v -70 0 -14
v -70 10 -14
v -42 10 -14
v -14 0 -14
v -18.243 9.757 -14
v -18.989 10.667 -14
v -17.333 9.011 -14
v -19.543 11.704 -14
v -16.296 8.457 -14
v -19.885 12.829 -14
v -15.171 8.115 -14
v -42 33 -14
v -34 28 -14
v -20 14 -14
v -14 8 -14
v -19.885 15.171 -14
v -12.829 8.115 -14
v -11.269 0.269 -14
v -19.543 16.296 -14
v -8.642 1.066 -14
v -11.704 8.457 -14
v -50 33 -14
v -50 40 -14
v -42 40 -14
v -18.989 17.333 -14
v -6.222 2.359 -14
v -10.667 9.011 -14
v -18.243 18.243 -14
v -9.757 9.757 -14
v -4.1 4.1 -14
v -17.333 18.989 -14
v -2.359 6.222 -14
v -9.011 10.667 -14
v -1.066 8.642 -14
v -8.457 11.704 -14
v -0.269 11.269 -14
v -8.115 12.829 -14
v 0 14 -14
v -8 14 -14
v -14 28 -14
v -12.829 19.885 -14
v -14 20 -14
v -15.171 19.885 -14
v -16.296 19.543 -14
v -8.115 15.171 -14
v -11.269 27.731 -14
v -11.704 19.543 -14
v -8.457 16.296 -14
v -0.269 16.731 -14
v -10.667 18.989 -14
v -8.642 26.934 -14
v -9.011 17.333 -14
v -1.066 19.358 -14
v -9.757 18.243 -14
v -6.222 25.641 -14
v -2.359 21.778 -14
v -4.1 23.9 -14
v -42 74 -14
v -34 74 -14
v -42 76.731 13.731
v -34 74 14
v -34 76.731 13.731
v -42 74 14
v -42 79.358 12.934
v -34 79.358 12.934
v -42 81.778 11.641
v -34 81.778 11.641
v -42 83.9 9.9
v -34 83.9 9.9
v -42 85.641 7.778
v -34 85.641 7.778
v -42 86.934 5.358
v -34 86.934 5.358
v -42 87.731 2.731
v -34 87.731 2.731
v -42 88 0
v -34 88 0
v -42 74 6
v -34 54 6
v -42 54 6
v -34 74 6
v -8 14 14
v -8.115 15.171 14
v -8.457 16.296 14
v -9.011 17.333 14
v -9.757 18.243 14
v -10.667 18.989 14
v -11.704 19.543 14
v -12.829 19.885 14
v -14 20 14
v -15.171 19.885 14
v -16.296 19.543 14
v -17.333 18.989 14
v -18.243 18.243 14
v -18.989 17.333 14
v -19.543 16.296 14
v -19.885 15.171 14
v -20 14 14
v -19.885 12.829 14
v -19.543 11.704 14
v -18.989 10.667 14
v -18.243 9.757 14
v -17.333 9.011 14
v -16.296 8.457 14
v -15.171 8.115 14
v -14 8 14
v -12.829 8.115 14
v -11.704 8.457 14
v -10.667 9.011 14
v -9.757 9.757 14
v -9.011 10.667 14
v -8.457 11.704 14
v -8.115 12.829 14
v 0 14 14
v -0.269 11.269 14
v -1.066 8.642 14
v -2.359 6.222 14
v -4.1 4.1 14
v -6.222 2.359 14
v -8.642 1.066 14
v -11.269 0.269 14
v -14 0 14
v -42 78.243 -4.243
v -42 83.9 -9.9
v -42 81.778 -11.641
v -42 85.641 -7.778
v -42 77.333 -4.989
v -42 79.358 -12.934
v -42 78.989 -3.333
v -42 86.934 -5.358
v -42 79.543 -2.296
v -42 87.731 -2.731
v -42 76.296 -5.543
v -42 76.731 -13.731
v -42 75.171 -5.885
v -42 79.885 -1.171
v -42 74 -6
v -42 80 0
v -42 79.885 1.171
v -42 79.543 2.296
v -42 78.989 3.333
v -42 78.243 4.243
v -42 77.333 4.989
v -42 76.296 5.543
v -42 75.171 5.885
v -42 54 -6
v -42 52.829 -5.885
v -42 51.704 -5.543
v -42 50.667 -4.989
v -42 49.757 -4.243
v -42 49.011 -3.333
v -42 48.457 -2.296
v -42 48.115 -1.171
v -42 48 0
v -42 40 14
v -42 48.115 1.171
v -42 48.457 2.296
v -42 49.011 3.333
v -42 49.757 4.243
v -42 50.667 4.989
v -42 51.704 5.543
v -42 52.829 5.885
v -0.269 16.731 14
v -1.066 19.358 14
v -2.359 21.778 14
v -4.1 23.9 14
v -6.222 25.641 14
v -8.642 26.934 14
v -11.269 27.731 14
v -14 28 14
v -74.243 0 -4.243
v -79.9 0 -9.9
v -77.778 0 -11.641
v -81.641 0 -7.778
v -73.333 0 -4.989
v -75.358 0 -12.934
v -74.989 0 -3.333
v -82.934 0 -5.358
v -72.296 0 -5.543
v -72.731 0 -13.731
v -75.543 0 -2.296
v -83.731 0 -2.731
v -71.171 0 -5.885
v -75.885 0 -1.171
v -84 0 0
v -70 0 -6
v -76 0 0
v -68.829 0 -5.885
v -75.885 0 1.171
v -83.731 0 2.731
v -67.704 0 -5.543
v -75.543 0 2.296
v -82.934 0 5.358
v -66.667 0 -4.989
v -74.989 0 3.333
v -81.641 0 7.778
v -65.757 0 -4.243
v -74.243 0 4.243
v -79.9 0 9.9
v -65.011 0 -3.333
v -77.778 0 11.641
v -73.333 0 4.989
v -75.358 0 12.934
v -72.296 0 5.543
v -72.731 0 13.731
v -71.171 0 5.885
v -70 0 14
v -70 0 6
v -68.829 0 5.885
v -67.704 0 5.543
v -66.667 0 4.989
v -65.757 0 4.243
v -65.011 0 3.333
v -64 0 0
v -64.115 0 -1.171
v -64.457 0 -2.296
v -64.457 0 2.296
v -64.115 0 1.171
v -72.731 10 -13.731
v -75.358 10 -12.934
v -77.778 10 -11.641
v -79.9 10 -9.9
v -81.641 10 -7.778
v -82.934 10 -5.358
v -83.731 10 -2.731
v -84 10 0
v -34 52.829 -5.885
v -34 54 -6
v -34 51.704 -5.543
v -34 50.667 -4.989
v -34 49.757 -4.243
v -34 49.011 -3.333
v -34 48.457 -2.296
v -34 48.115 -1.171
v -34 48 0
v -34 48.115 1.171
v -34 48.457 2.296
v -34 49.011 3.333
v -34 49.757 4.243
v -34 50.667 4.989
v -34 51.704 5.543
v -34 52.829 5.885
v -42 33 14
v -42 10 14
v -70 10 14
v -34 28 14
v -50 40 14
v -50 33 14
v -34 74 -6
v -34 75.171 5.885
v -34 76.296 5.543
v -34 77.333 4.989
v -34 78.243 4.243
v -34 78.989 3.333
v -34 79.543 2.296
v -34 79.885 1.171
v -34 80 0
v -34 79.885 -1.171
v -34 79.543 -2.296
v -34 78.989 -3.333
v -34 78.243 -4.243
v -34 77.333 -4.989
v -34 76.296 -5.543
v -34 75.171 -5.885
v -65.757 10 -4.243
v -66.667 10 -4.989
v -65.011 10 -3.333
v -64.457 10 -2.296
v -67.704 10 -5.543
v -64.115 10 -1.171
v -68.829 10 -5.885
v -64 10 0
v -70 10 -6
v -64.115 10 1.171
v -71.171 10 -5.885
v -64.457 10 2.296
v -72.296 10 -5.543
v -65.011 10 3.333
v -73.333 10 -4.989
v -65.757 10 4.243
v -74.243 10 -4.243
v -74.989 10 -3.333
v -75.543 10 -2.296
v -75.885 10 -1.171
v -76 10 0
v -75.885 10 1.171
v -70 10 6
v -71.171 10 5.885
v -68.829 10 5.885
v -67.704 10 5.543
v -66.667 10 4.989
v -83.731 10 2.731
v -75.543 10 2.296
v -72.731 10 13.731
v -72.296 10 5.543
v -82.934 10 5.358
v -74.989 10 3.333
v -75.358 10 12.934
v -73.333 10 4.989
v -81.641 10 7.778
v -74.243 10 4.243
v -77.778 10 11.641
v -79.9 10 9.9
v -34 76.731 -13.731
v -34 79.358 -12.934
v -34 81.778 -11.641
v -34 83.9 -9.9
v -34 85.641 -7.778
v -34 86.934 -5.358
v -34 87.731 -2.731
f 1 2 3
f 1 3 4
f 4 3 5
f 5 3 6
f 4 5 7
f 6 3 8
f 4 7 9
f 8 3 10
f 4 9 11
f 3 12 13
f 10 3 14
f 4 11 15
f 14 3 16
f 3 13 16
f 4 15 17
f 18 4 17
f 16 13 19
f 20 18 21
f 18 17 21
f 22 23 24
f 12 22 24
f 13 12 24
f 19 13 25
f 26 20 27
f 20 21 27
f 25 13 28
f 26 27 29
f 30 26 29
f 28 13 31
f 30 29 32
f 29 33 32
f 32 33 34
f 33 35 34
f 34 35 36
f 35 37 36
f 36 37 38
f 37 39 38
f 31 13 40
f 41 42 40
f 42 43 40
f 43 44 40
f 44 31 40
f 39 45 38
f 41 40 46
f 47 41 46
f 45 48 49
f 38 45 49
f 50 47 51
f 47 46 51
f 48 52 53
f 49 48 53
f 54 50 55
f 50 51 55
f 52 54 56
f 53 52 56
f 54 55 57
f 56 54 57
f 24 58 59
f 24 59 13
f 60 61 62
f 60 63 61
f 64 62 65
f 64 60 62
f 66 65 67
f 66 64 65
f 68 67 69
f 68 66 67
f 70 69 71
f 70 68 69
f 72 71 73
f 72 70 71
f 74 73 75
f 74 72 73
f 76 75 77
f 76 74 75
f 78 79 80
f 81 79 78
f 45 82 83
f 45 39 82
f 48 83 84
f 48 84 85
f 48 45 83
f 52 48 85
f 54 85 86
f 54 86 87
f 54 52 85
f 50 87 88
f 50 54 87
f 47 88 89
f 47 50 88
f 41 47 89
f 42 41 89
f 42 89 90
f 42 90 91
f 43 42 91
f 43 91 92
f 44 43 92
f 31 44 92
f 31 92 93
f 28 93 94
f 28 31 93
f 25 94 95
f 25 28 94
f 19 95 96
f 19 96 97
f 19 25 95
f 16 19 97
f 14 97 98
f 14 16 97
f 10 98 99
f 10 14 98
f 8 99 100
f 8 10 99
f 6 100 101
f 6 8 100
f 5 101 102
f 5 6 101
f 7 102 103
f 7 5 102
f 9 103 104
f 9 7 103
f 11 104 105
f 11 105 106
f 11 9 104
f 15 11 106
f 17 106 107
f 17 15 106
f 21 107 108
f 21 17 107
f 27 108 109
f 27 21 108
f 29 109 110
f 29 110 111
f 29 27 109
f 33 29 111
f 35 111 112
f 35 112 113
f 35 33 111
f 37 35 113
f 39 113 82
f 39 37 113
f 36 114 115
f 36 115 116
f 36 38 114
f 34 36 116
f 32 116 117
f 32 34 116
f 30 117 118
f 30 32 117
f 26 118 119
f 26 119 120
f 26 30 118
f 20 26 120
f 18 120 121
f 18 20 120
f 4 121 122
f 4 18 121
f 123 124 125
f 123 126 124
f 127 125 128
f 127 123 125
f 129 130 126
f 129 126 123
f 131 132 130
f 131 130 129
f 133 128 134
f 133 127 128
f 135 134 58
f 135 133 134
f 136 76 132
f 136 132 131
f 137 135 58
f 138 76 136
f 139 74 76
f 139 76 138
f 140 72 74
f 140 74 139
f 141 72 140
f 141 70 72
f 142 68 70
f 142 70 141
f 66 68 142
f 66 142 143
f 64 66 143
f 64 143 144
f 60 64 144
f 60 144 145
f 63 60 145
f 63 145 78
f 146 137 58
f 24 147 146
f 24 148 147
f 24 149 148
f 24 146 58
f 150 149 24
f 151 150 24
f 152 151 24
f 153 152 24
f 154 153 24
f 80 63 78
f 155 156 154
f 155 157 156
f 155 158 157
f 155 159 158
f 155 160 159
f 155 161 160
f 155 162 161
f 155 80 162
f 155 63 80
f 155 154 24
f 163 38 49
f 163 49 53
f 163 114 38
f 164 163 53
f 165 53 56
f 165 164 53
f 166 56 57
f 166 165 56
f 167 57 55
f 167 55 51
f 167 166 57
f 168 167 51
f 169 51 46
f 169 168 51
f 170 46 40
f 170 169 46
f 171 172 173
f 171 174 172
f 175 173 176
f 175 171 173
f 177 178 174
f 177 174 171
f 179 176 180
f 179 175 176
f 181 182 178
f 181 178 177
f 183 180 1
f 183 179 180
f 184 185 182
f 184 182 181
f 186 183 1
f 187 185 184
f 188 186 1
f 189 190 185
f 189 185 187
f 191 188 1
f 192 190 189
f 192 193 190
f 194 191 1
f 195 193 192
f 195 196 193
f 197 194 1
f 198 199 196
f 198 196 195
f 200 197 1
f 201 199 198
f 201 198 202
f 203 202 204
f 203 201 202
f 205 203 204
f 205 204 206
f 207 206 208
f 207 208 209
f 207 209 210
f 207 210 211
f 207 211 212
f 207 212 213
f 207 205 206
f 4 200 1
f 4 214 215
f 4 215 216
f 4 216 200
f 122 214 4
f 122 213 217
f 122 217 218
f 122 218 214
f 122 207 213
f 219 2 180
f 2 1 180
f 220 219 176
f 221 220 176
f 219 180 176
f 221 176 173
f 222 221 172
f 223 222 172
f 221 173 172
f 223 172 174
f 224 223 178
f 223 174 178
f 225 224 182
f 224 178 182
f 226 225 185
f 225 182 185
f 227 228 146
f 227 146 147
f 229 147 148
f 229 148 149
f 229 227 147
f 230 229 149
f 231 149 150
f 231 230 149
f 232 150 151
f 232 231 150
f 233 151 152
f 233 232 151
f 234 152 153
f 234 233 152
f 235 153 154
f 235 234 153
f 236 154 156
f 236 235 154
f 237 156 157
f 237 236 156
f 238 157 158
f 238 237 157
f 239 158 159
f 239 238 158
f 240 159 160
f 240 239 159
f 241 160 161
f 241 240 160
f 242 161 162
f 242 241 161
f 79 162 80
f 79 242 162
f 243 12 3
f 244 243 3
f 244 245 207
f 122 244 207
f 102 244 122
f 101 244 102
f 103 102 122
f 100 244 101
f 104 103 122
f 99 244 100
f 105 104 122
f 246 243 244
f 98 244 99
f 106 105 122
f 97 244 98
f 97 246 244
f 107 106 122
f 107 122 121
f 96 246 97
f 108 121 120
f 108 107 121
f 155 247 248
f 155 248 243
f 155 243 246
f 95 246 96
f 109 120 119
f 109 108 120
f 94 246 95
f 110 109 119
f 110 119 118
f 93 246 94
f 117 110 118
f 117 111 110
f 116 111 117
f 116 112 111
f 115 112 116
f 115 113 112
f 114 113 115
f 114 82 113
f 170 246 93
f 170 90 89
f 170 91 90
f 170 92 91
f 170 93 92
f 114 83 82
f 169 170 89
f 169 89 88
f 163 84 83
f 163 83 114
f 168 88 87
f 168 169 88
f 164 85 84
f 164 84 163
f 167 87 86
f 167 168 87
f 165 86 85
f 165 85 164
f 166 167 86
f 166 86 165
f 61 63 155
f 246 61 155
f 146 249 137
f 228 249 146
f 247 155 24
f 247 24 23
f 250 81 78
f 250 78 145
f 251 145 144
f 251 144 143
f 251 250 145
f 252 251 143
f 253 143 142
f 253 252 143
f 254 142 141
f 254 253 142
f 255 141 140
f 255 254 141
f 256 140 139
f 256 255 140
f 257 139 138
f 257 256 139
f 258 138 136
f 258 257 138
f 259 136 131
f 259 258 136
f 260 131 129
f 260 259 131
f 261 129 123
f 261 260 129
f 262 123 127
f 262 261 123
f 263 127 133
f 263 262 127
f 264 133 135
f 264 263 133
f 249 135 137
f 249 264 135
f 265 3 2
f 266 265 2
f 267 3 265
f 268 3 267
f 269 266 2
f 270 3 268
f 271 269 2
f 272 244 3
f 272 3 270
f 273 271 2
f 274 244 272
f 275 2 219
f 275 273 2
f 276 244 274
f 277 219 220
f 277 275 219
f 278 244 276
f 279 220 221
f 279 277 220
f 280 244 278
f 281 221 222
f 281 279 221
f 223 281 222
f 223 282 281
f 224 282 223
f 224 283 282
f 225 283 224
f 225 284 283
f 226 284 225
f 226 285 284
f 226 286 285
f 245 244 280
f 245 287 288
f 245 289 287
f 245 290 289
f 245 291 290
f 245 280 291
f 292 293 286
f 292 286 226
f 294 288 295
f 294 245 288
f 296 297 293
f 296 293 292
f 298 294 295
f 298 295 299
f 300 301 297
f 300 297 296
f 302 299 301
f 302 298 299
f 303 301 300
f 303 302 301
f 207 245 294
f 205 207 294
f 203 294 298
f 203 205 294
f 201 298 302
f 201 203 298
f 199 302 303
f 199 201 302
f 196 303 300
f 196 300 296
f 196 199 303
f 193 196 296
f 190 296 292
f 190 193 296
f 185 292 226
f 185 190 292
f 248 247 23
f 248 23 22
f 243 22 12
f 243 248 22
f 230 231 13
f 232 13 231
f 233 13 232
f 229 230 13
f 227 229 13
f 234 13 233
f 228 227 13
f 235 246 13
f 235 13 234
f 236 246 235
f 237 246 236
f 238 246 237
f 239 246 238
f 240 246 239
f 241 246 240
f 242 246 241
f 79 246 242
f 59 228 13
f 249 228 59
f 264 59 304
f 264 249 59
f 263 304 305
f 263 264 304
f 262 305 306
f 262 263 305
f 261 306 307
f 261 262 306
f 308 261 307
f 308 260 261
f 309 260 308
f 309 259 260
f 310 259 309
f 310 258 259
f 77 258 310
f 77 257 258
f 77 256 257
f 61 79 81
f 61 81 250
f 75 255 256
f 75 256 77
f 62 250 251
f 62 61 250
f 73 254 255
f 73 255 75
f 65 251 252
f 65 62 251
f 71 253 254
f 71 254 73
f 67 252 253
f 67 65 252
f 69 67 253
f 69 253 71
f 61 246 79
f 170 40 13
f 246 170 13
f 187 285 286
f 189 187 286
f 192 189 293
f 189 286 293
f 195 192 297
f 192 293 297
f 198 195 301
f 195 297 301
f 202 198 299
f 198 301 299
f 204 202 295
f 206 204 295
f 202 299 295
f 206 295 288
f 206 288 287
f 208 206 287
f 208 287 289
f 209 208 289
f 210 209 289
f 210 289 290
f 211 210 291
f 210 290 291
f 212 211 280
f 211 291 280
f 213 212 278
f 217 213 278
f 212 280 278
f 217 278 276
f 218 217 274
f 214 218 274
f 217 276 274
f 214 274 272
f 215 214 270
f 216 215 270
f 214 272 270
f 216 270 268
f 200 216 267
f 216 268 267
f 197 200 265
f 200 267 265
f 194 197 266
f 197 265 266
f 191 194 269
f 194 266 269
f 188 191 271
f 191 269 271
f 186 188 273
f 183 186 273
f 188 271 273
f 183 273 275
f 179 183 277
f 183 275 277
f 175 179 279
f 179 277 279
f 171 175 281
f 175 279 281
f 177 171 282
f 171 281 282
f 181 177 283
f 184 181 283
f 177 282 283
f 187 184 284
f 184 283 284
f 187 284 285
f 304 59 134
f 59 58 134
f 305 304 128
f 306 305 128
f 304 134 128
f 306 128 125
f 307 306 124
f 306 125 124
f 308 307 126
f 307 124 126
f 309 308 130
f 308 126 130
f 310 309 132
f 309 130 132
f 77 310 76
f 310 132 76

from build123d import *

# Parameters (mm, degrees)
SKETCH2_R           = 6
BOSS_EXTRUDE1_DEPTH = 14
CUT_EXTRUDE1_DEPTH  = 8
SKETCH4_R           = 6
CUT_EXTRUDE2_DEPTH  = 10
FILLET1_R           = 14


with BuildPart() as part:
    # Sketch2 → Boss-Extrude1 (new, symmetric)
    with BuildSketch(Plane.XY):
        Polygon((0, 0), (0, 28), (-34, 28), (-34, 88), (-42, 88), (-42, 40), (-50, 40), (-50, 33), (-42, 33), (-42, 10), (-84, 10), (-84, 0), align=None)
        with Locations((-14, 14)):
            Circle(SKETCH2_R, mode=Mode.SUBTRACT)
    extrude(amount=BOSS_EXTRUDE1_DEPTH, both=True)

    # Sketch3 → Cut-Extrude1 (cut)
    with BuildSketch(Plane(origin=(-34, 0, 0), x_dir=(0, 0, -1), z_dir=(1, 0, 0))):
        with BuildLine():
            Line((-6, 54), (-6, 74))
            ThreePointArc((-6, 74), (0, 80), (6, 74))
            Line((6, 74), (6, 54))
            ThreePointArc((6, 54), (0, 48), (-6, 54))
        make_face()
    extrude(amount=-CUT_EXTRUDE1_DEPTH, mode=Mode.SUBTRACT)

    # Sketch4 → Cut-Extrude2 (cut)
    with BuildSketch(Plane(origin=(0, 10, 0), x_dir=(1, 0, 0), z_dir=(0, 1, 0))):
        with Locations(Location((-70, 0, 0), (0, 0, 180))):
            Circle(SKETCH4_R)
    extrude(amount=-CUT_EXTRUDE2_DEPTH, mode=Mode.SUBTRACT)

    # Fillet1
    fillet1_edges = [part.edges().sort_by_distance(p)[0] for p in [
        (-84, 5, -14),
        (-84, 5, 14),
        (-38, 88, -14),
        (-38, 88, 14),
        (0, 0, 0),
        (0, 28, 0),
    ]]
    fillet(fillet1_edges, radius=FILLET1_R - 0.0001)  # a hair under: the kernel refuses the full size


solid = part.part
